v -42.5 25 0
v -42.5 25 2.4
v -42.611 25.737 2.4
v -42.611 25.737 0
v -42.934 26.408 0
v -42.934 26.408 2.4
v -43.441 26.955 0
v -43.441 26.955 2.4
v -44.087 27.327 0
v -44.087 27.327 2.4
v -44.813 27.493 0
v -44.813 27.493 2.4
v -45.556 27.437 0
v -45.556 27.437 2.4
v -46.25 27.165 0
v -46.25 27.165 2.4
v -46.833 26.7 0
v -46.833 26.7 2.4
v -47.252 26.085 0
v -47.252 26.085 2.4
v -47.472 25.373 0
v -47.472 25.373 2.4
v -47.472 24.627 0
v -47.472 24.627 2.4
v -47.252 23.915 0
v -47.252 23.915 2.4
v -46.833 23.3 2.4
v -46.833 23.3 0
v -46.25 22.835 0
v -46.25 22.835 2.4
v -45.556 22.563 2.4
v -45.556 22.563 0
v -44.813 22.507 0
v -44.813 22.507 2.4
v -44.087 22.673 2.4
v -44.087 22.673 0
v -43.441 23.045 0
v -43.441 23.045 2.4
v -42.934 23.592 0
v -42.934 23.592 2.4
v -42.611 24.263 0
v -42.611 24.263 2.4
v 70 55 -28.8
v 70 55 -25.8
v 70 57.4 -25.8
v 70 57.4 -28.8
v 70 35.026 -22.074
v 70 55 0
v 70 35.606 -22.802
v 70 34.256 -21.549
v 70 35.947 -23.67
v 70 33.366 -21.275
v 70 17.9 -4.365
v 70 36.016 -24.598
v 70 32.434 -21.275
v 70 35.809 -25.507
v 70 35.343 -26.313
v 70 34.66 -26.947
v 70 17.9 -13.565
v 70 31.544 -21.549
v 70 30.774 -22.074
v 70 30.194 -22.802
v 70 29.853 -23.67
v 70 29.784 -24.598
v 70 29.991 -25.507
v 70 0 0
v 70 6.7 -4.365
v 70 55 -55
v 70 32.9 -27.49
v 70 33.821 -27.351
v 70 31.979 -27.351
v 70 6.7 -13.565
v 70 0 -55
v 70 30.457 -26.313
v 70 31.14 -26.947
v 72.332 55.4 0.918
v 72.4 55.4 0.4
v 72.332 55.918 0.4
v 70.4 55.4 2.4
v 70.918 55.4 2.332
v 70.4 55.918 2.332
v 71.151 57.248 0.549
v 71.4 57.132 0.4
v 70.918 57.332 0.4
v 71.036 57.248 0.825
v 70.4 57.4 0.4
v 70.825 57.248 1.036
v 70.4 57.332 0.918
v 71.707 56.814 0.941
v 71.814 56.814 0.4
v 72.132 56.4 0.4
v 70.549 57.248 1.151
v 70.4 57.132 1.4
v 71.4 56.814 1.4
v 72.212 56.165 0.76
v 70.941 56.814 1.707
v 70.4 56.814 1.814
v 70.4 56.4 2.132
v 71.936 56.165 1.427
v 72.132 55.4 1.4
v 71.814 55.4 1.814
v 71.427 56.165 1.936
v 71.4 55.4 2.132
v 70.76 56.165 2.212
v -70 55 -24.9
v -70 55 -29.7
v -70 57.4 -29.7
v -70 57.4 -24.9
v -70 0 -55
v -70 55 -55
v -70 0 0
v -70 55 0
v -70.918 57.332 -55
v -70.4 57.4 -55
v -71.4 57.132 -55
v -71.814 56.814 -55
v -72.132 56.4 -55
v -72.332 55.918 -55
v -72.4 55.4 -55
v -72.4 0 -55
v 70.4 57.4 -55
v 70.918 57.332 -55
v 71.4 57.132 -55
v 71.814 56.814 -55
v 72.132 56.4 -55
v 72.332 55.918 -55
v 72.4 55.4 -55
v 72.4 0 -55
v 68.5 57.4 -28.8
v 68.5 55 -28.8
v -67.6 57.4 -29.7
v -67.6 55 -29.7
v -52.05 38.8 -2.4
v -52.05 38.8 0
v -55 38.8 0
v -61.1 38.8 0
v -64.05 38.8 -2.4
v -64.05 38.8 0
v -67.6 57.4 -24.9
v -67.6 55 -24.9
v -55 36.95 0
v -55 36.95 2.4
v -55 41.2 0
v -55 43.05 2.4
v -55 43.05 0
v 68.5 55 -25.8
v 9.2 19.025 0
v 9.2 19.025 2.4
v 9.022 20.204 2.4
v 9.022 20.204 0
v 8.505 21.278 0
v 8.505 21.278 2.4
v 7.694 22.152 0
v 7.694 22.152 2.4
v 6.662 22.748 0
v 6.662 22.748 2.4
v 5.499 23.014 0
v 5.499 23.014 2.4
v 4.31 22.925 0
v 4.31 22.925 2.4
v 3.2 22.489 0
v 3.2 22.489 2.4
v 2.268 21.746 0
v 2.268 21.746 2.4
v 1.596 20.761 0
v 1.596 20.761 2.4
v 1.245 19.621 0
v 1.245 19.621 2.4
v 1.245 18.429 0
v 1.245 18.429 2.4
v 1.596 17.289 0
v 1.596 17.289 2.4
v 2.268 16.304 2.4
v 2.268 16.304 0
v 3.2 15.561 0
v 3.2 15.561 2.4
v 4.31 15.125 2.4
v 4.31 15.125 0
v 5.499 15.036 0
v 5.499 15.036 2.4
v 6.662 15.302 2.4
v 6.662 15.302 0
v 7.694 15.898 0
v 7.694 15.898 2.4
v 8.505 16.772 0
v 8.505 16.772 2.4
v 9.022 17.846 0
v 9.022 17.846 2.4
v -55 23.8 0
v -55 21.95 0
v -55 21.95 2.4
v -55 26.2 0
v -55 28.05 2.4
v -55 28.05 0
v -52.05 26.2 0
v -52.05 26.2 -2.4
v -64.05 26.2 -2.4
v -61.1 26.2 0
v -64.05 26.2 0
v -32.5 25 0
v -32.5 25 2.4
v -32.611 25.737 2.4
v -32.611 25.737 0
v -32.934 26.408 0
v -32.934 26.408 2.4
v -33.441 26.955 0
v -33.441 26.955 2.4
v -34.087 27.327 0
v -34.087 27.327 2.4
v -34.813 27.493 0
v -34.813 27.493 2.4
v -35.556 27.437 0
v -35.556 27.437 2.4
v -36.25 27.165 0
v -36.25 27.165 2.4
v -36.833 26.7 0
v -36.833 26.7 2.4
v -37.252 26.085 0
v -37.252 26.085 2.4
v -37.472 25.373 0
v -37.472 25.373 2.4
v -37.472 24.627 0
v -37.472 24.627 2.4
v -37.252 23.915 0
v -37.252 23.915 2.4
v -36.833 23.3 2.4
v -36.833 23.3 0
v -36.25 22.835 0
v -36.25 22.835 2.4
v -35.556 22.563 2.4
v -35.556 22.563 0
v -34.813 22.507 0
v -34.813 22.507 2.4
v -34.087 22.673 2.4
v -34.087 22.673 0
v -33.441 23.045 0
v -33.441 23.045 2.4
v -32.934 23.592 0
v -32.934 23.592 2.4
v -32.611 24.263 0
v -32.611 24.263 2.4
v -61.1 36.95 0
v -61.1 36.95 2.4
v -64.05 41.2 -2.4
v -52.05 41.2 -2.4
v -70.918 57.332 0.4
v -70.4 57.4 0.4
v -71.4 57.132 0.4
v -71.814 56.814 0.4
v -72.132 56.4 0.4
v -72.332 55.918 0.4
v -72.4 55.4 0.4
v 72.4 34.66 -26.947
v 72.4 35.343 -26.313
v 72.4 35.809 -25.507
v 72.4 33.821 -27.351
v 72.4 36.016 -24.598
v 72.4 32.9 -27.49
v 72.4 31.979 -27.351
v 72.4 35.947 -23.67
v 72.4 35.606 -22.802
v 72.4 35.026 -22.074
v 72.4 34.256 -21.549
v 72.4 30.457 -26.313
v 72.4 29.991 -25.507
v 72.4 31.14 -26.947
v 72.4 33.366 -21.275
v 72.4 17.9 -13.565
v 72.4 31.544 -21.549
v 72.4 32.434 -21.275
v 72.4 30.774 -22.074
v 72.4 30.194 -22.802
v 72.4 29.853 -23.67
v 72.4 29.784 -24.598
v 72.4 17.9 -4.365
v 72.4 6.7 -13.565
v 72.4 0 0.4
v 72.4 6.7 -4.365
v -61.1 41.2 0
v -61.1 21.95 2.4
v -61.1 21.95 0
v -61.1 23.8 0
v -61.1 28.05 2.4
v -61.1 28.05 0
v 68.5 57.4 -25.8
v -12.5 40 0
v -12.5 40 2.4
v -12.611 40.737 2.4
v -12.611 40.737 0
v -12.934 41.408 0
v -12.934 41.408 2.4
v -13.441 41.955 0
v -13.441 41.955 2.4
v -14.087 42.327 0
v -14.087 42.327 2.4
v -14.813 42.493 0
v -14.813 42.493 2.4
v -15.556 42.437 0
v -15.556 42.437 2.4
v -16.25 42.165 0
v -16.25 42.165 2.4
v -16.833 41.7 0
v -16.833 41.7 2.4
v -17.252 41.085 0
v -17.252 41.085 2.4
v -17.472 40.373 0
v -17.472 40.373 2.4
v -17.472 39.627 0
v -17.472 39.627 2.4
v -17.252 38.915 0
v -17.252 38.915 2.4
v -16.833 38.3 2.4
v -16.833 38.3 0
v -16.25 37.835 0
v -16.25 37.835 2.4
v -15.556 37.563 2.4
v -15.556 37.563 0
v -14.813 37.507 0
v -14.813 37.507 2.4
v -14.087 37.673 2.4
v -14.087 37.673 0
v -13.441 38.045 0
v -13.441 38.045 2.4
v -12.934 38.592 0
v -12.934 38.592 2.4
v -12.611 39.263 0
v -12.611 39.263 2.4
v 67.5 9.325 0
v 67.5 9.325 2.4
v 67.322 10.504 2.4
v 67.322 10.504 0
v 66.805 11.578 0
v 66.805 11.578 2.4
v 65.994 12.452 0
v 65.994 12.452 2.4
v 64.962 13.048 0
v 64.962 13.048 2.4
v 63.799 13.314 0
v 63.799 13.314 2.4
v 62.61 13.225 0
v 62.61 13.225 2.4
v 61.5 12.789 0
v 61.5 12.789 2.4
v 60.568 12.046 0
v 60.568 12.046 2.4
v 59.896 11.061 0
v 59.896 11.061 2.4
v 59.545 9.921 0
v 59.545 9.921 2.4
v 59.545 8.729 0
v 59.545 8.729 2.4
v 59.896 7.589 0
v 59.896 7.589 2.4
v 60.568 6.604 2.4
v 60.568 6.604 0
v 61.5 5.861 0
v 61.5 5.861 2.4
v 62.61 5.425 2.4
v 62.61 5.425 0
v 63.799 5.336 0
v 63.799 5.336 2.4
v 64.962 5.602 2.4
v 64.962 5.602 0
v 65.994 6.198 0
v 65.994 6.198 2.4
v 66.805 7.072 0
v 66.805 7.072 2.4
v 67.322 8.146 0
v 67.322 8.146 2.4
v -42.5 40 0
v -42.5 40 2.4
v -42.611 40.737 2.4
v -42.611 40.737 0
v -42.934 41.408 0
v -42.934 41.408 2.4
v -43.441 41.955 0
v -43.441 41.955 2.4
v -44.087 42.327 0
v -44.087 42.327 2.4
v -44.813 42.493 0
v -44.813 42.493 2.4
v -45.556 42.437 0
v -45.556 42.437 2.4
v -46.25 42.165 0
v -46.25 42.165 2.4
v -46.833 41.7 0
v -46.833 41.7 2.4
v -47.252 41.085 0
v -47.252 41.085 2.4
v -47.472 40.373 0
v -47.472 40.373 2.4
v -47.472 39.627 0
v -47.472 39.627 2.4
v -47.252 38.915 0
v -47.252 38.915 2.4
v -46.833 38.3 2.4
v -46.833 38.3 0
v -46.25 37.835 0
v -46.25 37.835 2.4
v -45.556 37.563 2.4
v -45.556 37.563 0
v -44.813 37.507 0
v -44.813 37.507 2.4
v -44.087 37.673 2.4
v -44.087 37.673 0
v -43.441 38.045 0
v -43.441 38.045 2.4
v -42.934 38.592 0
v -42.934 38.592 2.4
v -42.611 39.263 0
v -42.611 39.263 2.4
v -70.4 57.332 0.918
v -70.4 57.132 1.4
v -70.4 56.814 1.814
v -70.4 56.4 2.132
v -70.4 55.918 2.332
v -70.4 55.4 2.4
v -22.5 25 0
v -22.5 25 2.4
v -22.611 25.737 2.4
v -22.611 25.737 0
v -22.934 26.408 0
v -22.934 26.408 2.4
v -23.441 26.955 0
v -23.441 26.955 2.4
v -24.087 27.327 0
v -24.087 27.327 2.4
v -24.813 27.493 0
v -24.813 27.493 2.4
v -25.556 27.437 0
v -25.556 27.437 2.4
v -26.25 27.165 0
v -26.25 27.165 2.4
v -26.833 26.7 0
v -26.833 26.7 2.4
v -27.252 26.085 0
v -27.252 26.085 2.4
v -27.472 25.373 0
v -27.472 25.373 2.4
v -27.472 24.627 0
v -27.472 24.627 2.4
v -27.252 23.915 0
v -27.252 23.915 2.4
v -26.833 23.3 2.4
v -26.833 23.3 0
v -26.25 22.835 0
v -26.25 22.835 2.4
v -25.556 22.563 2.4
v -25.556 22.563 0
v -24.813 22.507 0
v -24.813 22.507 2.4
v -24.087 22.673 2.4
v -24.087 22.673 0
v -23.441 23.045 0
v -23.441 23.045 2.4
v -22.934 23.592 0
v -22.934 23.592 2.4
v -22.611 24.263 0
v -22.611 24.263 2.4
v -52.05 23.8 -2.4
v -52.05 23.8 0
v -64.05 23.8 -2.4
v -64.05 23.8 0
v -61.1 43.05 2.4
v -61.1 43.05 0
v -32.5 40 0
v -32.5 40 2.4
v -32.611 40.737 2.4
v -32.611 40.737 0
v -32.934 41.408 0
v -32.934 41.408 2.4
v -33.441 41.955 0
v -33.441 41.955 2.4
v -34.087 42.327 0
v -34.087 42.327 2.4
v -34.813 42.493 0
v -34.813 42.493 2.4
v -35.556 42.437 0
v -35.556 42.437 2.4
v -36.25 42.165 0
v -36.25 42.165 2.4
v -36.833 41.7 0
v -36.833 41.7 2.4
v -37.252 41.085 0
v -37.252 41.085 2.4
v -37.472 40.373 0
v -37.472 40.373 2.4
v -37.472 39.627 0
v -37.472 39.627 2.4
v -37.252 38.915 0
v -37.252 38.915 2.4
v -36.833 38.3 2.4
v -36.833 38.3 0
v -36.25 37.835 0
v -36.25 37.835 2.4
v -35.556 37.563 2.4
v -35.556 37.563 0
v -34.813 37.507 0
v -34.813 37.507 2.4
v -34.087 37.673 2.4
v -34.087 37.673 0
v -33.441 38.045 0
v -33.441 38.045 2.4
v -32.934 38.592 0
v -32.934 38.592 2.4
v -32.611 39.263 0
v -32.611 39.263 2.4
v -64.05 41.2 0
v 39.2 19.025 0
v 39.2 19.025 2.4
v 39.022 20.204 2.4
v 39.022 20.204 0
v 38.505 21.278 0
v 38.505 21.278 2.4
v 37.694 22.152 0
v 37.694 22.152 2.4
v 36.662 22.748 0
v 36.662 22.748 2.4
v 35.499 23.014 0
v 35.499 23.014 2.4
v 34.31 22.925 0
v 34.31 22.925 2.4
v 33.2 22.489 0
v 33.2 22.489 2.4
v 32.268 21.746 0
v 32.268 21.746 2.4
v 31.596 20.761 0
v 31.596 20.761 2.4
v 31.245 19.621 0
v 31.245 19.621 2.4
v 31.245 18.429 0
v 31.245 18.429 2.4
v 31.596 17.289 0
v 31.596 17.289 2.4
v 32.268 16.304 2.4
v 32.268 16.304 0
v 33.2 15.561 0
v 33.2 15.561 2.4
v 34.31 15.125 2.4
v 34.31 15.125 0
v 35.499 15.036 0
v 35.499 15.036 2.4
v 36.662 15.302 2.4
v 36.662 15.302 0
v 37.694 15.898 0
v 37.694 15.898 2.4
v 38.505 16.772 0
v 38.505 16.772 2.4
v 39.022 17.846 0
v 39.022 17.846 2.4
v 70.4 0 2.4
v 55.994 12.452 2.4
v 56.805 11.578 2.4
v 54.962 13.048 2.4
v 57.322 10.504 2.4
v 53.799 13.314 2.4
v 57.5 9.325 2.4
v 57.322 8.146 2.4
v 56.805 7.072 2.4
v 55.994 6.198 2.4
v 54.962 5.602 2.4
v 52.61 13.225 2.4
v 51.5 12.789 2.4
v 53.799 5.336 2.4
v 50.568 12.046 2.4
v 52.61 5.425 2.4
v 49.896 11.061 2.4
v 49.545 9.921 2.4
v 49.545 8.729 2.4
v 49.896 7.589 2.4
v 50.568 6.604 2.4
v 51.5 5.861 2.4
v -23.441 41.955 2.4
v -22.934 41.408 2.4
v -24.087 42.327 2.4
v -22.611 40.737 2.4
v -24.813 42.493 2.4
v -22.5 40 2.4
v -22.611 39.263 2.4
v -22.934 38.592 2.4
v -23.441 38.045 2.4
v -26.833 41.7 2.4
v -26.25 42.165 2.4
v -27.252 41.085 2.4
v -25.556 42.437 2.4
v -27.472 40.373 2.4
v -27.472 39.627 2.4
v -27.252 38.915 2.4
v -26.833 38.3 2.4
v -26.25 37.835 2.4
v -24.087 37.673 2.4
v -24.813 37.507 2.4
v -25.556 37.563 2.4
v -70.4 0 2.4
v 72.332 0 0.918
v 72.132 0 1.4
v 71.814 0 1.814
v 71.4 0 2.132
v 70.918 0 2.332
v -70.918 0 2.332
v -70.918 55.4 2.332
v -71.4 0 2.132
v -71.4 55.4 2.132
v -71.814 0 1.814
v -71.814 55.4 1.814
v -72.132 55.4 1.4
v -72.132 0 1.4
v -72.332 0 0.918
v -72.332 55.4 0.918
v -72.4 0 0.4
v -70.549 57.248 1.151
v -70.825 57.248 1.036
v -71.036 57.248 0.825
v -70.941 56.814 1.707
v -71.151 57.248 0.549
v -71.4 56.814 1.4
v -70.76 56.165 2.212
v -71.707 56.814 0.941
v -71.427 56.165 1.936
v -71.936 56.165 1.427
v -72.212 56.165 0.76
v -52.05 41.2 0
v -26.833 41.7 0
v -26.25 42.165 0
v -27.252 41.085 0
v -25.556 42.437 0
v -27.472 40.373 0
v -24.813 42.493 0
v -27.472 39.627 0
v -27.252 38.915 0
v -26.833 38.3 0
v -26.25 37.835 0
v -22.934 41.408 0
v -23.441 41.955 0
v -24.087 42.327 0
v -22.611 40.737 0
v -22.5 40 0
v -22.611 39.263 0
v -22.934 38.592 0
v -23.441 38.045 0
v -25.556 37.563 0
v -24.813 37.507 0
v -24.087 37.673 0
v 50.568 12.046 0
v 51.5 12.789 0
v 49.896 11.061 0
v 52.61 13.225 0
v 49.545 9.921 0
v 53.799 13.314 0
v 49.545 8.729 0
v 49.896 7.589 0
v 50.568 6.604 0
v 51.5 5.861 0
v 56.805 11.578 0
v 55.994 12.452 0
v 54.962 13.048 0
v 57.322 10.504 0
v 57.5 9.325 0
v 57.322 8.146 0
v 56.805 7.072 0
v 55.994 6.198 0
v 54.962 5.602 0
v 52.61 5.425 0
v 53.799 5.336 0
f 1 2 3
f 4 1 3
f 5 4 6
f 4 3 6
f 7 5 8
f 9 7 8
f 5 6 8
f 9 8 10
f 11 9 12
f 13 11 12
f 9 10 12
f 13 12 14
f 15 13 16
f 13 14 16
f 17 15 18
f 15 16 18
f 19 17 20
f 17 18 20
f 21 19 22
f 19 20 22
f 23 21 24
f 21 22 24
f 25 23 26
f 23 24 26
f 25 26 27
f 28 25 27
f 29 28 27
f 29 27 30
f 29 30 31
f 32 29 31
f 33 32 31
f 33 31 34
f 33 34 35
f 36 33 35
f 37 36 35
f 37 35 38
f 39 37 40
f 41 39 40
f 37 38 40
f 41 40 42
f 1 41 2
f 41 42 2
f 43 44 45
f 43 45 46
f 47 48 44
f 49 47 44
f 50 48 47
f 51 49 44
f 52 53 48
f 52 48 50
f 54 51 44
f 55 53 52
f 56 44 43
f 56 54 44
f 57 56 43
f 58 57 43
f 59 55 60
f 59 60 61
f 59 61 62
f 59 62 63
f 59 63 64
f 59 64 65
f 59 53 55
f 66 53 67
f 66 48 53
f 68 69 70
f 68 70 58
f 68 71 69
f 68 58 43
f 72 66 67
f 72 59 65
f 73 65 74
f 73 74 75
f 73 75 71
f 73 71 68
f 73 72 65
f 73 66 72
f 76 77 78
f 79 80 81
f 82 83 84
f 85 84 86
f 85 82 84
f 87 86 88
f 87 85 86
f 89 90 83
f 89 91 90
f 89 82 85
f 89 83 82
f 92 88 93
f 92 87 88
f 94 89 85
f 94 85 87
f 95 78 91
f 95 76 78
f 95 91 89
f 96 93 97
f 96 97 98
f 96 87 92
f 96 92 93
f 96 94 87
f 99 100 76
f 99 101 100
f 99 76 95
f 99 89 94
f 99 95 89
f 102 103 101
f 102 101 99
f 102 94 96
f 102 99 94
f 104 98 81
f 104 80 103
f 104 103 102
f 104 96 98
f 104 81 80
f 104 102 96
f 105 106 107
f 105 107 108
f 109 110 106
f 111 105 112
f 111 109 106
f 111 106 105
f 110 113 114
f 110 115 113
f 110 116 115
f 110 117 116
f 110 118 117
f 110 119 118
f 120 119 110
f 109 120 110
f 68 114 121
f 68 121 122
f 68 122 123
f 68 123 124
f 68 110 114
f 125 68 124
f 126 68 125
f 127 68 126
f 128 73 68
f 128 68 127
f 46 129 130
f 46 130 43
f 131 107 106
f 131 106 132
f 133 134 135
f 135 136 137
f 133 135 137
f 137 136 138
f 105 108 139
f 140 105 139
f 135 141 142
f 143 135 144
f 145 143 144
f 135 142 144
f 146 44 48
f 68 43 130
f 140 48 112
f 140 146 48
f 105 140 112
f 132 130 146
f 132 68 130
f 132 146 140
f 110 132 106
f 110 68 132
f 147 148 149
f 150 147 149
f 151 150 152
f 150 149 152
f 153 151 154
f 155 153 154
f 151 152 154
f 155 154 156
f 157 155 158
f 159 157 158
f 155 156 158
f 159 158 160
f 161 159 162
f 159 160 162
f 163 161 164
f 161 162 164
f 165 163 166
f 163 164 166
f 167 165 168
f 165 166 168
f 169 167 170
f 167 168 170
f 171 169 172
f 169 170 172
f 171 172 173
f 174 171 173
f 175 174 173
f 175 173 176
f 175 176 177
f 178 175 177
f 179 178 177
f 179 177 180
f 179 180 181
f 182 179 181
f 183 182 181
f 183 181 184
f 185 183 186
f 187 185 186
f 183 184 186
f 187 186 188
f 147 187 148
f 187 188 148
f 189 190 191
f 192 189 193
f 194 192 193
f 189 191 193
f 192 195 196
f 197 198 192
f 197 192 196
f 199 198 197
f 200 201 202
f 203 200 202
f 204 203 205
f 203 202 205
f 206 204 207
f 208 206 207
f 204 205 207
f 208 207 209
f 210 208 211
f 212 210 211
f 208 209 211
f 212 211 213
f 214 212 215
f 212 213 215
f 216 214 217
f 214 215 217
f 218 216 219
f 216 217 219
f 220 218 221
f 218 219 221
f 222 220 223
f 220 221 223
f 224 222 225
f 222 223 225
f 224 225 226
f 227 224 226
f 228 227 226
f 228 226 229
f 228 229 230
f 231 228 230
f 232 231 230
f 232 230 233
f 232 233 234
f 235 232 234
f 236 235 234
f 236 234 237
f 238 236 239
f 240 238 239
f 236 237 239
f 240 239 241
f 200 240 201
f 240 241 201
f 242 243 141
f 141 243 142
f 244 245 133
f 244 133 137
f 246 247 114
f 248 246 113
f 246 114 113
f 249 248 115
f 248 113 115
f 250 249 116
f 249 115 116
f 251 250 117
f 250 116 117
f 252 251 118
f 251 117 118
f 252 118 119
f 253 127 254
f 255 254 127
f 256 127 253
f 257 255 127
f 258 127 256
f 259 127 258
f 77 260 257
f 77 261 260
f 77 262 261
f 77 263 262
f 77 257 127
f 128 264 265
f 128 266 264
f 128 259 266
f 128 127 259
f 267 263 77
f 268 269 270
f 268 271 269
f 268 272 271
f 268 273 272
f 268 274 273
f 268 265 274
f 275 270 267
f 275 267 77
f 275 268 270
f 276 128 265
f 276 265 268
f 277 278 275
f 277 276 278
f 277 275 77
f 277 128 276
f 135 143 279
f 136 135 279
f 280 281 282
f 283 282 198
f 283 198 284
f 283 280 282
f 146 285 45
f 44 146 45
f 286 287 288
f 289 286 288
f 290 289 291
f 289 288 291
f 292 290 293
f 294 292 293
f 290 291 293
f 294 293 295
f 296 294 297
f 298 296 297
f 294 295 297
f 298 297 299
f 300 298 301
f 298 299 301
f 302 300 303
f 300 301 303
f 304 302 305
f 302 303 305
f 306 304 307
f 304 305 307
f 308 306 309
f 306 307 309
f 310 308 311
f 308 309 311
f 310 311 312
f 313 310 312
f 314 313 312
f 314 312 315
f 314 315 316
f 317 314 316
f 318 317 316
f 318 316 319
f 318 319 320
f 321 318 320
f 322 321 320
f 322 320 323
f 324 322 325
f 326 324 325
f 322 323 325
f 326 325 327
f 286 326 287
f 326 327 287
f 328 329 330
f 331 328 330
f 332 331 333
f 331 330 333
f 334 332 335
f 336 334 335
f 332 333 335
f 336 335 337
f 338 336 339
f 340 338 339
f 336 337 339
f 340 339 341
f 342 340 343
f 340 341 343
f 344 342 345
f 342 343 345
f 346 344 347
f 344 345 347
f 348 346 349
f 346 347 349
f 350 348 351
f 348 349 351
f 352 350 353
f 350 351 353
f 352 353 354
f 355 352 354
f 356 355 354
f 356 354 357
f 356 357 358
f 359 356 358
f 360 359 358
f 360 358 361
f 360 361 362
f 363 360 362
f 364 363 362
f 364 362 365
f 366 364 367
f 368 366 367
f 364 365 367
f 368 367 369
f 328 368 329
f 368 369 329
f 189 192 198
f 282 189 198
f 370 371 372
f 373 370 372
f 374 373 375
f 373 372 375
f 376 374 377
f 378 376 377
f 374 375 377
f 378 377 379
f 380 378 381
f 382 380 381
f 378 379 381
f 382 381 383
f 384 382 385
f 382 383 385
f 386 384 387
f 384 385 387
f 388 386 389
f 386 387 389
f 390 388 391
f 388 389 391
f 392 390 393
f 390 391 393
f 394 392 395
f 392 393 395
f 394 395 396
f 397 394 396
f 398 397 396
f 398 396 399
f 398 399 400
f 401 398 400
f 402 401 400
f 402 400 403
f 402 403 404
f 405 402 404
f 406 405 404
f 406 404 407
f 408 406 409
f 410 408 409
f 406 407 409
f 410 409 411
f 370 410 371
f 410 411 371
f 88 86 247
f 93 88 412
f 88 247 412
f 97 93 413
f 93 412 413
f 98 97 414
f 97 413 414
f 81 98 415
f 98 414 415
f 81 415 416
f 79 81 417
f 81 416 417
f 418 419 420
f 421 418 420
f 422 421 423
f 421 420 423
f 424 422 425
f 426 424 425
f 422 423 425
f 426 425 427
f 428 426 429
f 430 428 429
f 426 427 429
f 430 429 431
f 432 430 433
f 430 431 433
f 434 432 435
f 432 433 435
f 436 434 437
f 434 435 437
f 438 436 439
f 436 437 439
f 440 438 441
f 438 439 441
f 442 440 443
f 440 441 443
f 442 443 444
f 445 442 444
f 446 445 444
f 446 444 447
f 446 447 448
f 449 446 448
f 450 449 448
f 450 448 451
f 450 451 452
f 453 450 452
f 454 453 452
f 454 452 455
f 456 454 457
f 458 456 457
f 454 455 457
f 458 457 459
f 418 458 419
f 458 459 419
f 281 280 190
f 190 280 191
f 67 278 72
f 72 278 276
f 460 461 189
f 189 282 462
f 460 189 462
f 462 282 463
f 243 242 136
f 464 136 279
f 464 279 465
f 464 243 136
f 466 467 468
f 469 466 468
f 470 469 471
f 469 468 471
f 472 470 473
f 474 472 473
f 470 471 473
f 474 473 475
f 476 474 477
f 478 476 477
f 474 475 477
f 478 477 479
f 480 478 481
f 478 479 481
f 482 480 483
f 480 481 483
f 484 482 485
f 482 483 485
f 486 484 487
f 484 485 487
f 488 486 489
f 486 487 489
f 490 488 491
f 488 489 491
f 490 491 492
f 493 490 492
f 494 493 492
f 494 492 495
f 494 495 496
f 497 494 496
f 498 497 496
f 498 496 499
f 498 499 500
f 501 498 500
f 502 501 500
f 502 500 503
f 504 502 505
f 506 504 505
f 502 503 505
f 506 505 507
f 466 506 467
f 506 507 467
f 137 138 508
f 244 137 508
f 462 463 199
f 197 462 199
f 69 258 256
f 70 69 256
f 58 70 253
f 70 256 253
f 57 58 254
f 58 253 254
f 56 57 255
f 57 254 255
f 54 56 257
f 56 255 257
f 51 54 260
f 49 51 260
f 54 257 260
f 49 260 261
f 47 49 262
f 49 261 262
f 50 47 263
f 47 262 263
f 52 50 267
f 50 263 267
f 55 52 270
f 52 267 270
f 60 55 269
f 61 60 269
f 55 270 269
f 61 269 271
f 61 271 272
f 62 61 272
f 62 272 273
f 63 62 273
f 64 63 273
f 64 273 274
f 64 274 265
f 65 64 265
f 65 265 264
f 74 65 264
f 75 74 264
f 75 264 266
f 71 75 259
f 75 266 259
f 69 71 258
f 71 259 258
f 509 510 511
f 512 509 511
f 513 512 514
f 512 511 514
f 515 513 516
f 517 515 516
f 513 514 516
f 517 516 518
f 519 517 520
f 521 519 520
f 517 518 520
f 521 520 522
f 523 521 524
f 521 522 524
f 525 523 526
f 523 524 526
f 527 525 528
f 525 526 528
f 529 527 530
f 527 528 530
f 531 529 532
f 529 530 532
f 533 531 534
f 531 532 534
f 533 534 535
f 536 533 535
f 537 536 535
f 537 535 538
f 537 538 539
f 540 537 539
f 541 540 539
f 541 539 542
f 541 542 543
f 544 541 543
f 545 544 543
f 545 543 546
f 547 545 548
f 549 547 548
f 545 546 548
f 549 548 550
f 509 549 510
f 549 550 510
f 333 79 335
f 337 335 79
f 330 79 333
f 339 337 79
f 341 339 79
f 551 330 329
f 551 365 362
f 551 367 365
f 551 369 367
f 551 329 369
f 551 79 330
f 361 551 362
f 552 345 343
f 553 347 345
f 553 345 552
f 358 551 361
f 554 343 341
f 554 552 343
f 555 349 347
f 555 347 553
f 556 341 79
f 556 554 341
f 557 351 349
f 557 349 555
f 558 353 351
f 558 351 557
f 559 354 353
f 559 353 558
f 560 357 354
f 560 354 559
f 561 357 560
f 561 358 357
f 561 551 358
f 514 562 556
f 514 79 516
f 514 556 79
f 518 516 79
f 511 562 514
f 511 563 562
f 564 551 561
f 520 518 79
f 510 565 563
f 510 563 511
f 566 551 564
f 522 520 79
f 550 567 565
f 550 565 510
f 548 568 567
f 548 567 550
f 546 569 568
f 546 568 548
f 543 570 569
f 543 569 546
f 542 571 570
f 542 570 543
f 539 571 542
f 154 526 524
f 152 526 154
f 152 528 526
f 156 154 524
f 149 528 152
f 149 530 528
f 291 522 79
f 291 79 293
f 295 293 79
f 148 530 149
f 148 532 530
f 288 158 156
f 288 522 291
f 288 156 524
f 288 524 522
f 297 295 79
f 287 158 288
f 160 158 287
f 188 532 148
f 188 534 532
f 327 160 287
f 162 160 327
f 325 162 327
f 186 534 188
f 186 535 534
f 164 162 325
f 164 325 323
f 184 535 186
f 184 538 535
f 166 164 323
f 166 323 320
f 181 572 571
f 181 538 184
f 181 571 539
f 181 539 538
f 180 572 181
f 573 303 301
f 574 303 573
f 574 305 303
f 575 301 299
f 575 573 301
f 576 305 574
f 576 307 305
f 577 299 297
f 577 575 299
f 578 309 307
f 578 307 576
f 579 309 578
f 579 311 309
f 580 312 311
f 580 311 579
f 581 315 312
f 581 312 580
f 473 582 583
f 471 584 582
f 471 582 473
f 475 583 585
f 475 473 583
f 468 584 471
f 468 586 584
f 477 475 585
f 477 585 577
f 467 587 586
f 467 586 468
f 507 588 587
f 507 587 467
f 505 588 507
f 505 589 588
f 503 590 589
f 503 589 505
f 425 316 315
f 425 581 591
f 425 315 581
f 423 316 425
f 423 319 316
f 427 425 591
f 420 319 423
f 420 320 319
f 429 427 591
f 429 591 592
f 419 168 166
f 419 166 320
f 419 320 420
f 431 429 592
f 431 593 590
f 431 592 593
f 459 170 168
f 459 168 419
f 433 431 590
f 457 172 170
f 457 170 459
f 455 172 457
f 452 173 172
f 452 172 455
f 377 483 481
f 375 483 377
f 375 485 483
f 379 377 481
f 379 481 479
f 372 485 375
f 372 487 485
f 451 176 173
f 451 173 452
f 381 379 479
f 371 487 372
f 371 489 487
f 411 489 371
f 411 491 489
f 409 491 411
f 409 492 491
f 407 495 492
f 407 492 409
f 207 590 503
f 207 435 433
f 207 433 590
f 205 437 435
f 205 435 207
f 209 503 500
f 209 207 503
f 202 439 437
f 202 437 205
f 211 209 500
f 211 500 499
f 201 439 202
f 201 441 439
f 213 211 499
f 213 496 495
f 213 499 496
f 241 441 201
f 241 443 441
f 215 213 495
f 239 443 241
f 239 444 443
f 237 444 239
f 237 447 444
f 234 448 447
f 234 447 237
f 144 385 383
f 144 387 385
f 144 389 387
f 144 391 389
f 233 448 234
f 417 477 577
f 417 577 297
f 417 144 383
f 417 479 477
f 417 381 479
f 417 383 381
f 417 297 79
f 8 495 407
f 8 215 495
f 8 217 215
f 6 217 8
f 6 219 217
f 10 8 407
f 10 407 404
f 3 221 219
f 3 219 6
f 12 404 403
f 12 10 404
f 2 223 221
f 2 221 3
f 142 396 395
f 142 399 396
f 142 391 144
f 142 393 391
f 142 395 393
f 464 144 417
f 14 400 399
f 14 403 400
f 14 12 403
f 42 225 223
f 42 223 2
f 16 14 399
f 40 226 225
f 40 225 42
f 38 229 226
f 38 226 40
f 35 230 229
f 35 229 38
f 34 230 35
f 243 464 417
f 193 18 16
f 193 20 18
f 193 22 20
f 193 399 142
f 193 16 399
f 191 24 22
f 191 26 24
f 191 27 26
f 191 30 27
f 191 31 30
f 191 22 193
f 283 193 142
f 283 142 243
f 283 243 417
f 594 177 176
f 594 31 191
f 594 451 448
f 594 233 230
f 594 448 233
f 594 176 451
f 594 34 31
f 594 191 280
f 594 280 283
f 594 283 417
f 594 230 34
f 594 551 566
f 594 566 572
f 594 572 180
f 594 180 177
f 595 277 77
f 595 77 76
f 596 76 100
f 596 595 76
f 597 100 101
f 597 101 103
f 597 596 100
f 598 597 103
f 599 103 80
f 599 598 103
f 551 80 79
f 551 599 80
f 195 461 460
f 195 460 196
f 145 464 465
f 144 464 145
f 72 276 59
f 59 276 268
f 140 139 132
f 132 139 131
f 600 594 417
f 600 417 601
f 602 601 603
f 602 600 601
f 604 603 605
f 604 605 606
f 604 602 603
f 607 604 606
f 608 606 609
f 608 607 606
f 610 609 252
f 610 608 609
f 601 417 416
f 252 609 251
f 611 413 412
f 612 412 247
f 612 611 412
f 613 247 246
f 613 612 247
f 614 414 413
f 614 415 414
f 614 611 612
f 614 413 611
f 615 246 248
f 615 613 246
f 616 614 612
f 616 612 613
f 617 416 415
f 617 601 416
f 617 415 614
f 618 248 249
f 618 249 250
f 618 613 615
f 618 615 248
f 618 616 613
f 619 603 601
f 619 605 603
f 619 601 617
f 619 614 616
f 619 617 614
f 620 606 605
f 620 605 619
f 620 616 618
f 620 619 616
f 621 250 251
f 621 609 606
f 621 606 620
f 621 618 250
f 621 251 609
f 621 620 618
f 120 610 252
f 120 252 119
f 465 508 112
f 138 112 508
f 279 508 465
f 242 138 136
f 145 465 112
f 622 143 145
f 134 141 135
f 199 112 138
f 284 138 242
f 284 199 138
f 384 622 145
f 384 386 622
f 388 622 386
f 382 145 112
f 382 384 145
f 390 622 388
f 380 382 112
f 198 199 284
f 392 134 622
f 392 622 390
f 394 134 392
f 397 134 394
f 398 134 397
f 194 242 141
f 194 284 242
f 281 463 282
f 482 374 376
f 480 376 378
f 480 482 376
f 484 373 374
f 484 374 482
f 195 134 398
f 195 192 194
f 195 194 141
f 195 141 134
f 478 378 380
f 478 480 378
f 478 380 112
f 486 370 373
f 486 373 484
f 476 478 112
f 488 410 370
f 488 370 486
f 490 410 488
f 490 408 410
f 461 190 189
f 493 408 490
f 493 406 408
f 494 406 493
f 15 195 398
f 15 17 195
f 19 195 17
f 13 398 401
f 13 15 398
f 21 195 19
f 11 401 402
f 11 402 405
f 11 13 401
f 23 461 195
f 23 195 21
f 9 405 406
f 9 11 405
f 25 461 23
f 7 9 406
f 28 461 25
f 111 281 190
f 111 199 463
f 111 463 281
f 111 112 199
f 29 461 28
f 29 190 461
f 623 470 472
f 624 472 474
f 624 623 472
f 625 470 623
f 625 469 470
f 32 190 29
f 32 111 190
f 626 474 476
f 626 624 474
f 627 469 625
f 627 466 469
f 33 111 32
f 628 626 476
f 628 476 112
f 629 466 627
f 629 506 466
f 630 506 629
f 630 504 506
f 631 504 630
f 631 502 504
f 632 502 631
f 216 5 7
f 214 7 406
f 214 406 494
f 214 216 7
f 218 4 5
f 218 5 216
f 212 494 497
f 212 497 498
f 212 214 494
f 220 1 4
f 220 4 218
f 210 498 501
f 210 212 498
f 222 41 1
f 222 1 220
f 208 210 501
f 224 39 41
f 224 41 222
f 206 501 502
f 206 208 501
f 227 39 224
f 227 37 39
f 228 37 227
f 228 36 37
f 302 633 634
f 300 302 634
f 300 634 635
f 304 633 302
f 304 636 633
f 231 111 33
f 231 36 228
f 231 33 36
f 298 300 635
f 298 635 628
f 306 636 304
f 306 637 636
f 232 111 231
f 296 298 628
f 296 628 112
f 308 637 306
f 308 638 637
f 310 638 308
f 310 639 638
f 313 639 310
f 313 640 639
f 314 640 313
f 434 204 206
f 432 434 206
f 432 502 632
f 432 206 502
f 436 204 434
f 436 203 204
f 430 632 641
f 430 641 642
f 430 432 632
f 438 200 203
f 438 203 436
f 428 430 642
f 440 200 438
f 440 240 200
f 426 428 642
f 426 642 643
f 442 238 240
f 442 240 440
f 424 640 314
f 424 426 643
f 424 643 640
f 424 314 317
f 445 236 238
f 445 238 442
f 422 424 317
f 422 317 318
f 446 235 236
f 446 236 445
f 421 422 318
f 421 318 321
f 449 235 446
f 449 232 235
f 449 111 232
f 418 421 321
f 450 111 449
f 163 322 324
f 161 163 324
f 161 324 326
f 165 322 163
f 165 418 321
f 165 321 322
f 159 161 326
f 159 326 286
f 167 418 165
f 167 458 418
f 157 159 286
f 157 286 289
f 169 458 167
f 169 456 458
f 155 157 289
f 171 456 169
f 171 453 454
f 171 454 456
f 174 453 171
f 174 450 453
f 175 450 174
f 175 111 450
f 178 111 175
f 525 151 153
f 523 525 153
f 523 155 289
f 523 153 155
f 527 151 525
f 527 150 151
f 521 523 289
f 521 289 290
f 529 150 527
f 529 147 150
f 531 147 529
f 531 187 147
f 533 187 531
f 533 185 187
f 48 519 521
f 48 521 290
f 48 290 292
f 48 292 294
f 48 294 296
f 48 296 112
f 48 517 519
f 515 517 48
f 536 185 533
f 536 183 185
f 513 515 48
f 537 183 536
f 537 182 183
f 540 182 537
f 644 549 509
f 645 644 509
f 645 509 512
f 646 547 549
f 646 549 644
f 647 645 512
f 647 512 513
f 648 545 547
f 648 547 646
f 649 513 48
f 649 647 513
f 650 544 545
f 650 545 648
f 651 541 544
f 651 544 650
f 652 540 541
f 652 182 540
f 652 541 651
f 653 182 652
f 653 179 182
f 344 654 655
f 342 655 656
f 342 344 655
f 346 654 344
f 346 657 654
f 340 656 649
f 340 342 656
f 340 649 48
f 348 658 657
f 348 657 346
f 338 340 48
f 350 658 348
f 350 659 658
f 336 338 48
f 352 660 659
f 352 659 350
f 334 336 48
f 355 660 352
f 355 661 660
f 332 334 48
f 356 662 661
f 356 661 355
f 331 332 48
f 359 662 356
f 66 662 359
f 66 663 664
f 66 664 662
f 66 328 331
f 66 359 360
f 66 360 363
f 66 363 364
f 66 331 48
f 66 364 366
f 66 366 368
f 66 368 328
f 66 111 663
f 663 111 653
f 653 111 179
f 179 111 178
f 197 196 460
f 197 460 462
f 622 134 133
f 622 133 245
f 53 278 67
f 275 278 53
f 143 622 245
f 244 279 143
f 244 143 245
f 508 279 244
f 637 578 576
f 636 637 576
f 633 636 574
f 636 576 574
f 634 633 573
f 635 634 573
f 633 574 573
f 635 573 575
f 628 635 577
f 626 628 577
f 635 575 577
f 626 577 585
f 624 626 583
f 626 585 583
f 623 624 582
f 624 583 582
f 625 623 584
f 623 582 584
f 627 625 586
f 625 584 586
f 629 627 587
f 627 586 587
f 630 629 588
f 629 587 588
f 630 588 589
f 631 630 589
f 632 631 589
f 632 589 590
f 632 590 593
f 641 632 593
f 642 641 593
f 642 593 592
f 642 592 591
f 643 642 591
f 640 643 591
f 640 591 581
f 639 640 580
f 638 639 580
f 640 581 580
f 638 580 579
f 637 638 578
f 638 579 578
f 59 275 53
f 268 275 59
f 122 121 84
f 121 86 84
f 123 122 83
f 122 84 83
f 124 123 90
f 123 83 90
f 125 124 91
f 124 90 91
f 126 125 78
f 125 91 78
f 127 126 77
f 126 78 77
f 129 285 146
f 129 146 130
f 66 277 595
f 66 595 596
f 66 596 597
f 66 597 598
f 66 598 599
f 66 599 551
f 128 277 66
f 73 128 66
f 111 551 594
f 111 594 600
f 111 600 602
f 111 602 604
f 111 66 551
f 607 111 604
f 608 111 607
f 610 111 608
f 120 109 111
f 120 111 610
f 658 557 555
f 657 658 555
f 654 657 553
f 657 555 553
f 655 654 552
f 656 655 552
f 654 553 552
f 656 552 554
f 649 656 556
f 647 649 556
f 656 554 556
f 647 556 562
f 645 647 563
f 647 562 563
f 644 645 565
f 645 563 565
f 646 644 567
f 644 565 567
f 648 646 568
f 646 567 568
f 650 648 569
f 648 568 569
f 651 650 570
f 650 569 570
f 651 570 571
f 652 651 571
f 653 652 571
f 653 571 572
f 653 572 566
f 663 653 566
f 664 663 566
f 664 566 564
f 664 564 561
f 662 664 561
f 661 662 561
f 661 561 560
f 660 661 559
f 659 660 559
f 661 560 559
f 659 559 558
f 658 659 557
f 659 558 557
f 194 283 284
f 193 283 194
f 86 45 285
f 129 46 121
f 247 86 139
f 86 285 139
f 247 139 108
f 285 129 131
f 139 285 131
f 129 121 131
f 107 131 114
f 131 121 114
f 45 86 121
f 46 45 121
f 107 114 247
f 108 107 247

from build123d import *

# Parameters (mm, degrees)
BOSS_EXTRUDE1_DEPTH = 55
SKETCH3_W           = 9.2
SKETCH3_H           = 11.2
CUT_EXTRUDE1_DEPTH  = 2.4
SKETCH4_R           = 4
CUT_EXTRUDE2_DEPTH  = 2.4
SKETCH5_R           = 2.5
CUT_EXTRUDE3_DEPTH  = 2.4
SKETCH7_R           = 4
CUT_EXTRUDE4_DEPTH  = 2.4
SKETCH8_W           = 6.1
SKETCH8_H           = 6.1
CUT_EXTRUDE5_DEPTH  = 2.4
SKETCH9_W           = 12
SKETCH9_H           = 2.4
BOSS_EXTRUDE3_DEPTH = 2.4
SKETCH10_R          = 4
CUT_EXTRUDE6_DEPTH  = 2.4
BOSS_EXTRUDE4_DEPTH = 2.4
SKETCH12_W          = 1.5
SKETCH12_H          = 3
SKETCH12_W_2        = 2.4
SKETCH12_H_2        = 4.8
CUT_EXTRUDE7_DEPTH  = 2.4
SKETCH13_R          = 3.125
CUT_EXTRUDE8_DEPTH  = 2.4
FILLET1_R           = 2


with BuildPart() as part:
    # Sketch2 → Boss-Extrude1 (new body)
    with BuildSketch(Plane(origin=(0, 0, 0), x_dir=(1, 0, 0), z_dir=(0, 1, 0))):
        with BuildLine():
            Line((-70, 55), (-70, 0))
            Line((-70, 0), (70, 0))
            Line((70, 0), (70, 55))
            Line((70, 55), (72.4, 55))
            Line((72.4, 55), (72.4, -0.4))
            ThreePointArc((72.4, -0.4), (71.814213562, -1.814213562), (70.4, -2.4))
            Line((70.4, -2.4), (-70.4, -2.4))
            ThreePointArc((-70.4, -2.4), (-71.814213562, -1.814213562), (-72.4, -0.4))
            Line((-72.4, -0.4), (-72.4, 55))
            Line((-72.4, 55), (-70, 55))
        make_face()
    extrude(amount=BOSS_EXTRUDE1_DEPTH)

    # Sketch3 → Cut-Extrude1 (cut)
    with BuildSketch(Plane(origin=(72.4, 0, 0), x_dir=(0, 0, -1), z_dir=(1, 0, 0))):
        with Locations((8.964963507, 12.3)):
            Rectangle(SKETCH3_W, SKETCH3_H)
    extrude(amount=-CUT_EXTRUDE1_DEPTH, mode=Mode.SUBTRACT)

    # Sketch4 → Cut-Extrude2 (cut)
    with BuildSketch(Plane.XY.offset(2.4)):
        with Locations((53.50014494, 9.325)):
            Circle(SKETCH4_R)
        with Locations((35.20014494, 19.025)):
            Circle(SKETCH4_R)
    extrude(amount=-CUT_EXTRUDE2_DEPTH, mode=Mode.SUBTRACT)

    # Sketch5 → Cut-Extrude3 (cut)
    with BuildSketch(Plane.XY.offset(2.4)):
        with Locations((-45, 25)):
            Circle(SKETCH5_R)
        with Locations((-35, 25)):
            Circle(SKETCH5_R)
        with Locations((-25, 25)):
            Circle(SKETCH5_R)
        with Locations((-35, 40)):
            Circle(SKETCH5_R)
        with Locations((-25, 40)):
            Circle(SKETCH5_R)
        with Locations((-15, 40)):
            Circle(SKETCH5_R)
        with Locations((-45, 40)):
            Circle(SKETCH5_R)
    extrude(amount=-CUT_EXTRUDE3_DEPTH, mode=Mode.SUBTRACT)

    # Sketch7 → Cut-Extrude4 (cut)
    with BuildSketch(Plane.XY.offset(2.4)):
        with Locations((5.20014494, 19.025)):
            Circle(SKETCH7_R)
    extrude(amount=-CUT_EXTRUDE4_DEPTH, mode=Mode.SUBTRACT)

    # Sketch8 → Cut-Extrude5 (cut)
    with BuildSketch(Plane.XY.offset(2.4)):
        with Locations((-58.05, 25)):
            Rectangle(SKETCH8_W, SKETCH8_H)
        with Locations((-58.05, 40)):
            Rectangle(SKETCH8_W, SKETCH8_H)
    extrude(amount=-CUT_EXTRUDE5_DEPTH, mode=Mode.SUBTRACT)

    # Sketch9 → Boss-Extrude3 (add)
    with BuildSketch(Plane(origin=(0, 0, 0), x_dir=(-1, 0, 0), z_dir=(0, 0, -1))):
        with Locations((58.05, 25)):
            Rectangle(SKETCH9_W, SKETCH9_H)
        with Locations((58.05, 40)):
            Rectangle(SKETCH9_W, SKETCH9_H)
    extrude(amount=BOSS_EXTRUDE3_DEPTH)

    # Sketch10 → Cut-Extrude6 (cut)
    with BuildSketch(Plane.XY.offset(2.4)):
        with Locations((63.50014494, 9.325)):
            Circle(SKETCH10_R)
    extrude(amount=-CUT_EXTRUDE6_DEPTH, mode=Mode.SUBTRACT)

    # Sketch11 → Boss-Extrude4 (add)
    with BuildSketch(Plane(origin=(0, 55, 0), x_dir=(1, 0, 0), z_dir=(0, 1, 0))):
        with BuildLine():
            Line((-72.4, 55), (72.4, 55))
            Line((72.4, 55), (72.4, -0.4))
            ThreePointArc((72.4, -0.4), (71.814213562, -1.814213562), (70.4, -2.4))
            Line((70.4, -2.4), (-70.4, -2.4))
            ThreePointArc((-70.4, -2.4), (-71.814213562, -1.814213562), (-72.4, -0.4))
            Line((-72.4, -0.4), (-72.4, 55))
        make_face()
    extrude(amount=BOSS_EXTRUDE4_DEPTH)

    # Sketch12 → Cut-Extrude7 (cut)
    with BuildSketch(Plane(origin=(0, 57.4, 0), x_dir=(1, 0, 0), z_dir=(0, 1, 0))):
        with Locations((69.25, 27.3)):
            Rectangle(SKETCH12_W, SKETCH12_H)
        with Locations((-68.8, 27.3)):
            Rectangle(SKETCH12_W_2, SKETCH12_H_2)
    extrude(amount=-CUT_EXTRUDE7_DEPTH, mode=Mode.SUBTRACT)

    # Sketch13 → Cut-Extrude8 (cut)
    with BuildSketch(Plane(origin=(72.4, 0, 0), x_dir=(0, 0, -1), z_dir=(1, 0, 0))):
        with Locations((24.364963507, 32.9)):
            Circle(SKETCH13_R)
    extrude(amount=-CUT_EXTRUDE8_DEPTH, mode=Mode.SUBTRACT)

    # Fillet1
    fillet1_edges = [part.edges().sort_by_distance(p)[0] for p in [
        (-72.4, 57.4, -27.3),
        (-71.814213562, 57.4, 1.814213562),
        (0, 57.4, 2.4),
        (71.814213562, 57.4, 1.814213562),
        (72.4, 57.4, -27.3),
    ]]
    fillet(fillet1_edges, radius=FILLET1_R)


solid = part.part
